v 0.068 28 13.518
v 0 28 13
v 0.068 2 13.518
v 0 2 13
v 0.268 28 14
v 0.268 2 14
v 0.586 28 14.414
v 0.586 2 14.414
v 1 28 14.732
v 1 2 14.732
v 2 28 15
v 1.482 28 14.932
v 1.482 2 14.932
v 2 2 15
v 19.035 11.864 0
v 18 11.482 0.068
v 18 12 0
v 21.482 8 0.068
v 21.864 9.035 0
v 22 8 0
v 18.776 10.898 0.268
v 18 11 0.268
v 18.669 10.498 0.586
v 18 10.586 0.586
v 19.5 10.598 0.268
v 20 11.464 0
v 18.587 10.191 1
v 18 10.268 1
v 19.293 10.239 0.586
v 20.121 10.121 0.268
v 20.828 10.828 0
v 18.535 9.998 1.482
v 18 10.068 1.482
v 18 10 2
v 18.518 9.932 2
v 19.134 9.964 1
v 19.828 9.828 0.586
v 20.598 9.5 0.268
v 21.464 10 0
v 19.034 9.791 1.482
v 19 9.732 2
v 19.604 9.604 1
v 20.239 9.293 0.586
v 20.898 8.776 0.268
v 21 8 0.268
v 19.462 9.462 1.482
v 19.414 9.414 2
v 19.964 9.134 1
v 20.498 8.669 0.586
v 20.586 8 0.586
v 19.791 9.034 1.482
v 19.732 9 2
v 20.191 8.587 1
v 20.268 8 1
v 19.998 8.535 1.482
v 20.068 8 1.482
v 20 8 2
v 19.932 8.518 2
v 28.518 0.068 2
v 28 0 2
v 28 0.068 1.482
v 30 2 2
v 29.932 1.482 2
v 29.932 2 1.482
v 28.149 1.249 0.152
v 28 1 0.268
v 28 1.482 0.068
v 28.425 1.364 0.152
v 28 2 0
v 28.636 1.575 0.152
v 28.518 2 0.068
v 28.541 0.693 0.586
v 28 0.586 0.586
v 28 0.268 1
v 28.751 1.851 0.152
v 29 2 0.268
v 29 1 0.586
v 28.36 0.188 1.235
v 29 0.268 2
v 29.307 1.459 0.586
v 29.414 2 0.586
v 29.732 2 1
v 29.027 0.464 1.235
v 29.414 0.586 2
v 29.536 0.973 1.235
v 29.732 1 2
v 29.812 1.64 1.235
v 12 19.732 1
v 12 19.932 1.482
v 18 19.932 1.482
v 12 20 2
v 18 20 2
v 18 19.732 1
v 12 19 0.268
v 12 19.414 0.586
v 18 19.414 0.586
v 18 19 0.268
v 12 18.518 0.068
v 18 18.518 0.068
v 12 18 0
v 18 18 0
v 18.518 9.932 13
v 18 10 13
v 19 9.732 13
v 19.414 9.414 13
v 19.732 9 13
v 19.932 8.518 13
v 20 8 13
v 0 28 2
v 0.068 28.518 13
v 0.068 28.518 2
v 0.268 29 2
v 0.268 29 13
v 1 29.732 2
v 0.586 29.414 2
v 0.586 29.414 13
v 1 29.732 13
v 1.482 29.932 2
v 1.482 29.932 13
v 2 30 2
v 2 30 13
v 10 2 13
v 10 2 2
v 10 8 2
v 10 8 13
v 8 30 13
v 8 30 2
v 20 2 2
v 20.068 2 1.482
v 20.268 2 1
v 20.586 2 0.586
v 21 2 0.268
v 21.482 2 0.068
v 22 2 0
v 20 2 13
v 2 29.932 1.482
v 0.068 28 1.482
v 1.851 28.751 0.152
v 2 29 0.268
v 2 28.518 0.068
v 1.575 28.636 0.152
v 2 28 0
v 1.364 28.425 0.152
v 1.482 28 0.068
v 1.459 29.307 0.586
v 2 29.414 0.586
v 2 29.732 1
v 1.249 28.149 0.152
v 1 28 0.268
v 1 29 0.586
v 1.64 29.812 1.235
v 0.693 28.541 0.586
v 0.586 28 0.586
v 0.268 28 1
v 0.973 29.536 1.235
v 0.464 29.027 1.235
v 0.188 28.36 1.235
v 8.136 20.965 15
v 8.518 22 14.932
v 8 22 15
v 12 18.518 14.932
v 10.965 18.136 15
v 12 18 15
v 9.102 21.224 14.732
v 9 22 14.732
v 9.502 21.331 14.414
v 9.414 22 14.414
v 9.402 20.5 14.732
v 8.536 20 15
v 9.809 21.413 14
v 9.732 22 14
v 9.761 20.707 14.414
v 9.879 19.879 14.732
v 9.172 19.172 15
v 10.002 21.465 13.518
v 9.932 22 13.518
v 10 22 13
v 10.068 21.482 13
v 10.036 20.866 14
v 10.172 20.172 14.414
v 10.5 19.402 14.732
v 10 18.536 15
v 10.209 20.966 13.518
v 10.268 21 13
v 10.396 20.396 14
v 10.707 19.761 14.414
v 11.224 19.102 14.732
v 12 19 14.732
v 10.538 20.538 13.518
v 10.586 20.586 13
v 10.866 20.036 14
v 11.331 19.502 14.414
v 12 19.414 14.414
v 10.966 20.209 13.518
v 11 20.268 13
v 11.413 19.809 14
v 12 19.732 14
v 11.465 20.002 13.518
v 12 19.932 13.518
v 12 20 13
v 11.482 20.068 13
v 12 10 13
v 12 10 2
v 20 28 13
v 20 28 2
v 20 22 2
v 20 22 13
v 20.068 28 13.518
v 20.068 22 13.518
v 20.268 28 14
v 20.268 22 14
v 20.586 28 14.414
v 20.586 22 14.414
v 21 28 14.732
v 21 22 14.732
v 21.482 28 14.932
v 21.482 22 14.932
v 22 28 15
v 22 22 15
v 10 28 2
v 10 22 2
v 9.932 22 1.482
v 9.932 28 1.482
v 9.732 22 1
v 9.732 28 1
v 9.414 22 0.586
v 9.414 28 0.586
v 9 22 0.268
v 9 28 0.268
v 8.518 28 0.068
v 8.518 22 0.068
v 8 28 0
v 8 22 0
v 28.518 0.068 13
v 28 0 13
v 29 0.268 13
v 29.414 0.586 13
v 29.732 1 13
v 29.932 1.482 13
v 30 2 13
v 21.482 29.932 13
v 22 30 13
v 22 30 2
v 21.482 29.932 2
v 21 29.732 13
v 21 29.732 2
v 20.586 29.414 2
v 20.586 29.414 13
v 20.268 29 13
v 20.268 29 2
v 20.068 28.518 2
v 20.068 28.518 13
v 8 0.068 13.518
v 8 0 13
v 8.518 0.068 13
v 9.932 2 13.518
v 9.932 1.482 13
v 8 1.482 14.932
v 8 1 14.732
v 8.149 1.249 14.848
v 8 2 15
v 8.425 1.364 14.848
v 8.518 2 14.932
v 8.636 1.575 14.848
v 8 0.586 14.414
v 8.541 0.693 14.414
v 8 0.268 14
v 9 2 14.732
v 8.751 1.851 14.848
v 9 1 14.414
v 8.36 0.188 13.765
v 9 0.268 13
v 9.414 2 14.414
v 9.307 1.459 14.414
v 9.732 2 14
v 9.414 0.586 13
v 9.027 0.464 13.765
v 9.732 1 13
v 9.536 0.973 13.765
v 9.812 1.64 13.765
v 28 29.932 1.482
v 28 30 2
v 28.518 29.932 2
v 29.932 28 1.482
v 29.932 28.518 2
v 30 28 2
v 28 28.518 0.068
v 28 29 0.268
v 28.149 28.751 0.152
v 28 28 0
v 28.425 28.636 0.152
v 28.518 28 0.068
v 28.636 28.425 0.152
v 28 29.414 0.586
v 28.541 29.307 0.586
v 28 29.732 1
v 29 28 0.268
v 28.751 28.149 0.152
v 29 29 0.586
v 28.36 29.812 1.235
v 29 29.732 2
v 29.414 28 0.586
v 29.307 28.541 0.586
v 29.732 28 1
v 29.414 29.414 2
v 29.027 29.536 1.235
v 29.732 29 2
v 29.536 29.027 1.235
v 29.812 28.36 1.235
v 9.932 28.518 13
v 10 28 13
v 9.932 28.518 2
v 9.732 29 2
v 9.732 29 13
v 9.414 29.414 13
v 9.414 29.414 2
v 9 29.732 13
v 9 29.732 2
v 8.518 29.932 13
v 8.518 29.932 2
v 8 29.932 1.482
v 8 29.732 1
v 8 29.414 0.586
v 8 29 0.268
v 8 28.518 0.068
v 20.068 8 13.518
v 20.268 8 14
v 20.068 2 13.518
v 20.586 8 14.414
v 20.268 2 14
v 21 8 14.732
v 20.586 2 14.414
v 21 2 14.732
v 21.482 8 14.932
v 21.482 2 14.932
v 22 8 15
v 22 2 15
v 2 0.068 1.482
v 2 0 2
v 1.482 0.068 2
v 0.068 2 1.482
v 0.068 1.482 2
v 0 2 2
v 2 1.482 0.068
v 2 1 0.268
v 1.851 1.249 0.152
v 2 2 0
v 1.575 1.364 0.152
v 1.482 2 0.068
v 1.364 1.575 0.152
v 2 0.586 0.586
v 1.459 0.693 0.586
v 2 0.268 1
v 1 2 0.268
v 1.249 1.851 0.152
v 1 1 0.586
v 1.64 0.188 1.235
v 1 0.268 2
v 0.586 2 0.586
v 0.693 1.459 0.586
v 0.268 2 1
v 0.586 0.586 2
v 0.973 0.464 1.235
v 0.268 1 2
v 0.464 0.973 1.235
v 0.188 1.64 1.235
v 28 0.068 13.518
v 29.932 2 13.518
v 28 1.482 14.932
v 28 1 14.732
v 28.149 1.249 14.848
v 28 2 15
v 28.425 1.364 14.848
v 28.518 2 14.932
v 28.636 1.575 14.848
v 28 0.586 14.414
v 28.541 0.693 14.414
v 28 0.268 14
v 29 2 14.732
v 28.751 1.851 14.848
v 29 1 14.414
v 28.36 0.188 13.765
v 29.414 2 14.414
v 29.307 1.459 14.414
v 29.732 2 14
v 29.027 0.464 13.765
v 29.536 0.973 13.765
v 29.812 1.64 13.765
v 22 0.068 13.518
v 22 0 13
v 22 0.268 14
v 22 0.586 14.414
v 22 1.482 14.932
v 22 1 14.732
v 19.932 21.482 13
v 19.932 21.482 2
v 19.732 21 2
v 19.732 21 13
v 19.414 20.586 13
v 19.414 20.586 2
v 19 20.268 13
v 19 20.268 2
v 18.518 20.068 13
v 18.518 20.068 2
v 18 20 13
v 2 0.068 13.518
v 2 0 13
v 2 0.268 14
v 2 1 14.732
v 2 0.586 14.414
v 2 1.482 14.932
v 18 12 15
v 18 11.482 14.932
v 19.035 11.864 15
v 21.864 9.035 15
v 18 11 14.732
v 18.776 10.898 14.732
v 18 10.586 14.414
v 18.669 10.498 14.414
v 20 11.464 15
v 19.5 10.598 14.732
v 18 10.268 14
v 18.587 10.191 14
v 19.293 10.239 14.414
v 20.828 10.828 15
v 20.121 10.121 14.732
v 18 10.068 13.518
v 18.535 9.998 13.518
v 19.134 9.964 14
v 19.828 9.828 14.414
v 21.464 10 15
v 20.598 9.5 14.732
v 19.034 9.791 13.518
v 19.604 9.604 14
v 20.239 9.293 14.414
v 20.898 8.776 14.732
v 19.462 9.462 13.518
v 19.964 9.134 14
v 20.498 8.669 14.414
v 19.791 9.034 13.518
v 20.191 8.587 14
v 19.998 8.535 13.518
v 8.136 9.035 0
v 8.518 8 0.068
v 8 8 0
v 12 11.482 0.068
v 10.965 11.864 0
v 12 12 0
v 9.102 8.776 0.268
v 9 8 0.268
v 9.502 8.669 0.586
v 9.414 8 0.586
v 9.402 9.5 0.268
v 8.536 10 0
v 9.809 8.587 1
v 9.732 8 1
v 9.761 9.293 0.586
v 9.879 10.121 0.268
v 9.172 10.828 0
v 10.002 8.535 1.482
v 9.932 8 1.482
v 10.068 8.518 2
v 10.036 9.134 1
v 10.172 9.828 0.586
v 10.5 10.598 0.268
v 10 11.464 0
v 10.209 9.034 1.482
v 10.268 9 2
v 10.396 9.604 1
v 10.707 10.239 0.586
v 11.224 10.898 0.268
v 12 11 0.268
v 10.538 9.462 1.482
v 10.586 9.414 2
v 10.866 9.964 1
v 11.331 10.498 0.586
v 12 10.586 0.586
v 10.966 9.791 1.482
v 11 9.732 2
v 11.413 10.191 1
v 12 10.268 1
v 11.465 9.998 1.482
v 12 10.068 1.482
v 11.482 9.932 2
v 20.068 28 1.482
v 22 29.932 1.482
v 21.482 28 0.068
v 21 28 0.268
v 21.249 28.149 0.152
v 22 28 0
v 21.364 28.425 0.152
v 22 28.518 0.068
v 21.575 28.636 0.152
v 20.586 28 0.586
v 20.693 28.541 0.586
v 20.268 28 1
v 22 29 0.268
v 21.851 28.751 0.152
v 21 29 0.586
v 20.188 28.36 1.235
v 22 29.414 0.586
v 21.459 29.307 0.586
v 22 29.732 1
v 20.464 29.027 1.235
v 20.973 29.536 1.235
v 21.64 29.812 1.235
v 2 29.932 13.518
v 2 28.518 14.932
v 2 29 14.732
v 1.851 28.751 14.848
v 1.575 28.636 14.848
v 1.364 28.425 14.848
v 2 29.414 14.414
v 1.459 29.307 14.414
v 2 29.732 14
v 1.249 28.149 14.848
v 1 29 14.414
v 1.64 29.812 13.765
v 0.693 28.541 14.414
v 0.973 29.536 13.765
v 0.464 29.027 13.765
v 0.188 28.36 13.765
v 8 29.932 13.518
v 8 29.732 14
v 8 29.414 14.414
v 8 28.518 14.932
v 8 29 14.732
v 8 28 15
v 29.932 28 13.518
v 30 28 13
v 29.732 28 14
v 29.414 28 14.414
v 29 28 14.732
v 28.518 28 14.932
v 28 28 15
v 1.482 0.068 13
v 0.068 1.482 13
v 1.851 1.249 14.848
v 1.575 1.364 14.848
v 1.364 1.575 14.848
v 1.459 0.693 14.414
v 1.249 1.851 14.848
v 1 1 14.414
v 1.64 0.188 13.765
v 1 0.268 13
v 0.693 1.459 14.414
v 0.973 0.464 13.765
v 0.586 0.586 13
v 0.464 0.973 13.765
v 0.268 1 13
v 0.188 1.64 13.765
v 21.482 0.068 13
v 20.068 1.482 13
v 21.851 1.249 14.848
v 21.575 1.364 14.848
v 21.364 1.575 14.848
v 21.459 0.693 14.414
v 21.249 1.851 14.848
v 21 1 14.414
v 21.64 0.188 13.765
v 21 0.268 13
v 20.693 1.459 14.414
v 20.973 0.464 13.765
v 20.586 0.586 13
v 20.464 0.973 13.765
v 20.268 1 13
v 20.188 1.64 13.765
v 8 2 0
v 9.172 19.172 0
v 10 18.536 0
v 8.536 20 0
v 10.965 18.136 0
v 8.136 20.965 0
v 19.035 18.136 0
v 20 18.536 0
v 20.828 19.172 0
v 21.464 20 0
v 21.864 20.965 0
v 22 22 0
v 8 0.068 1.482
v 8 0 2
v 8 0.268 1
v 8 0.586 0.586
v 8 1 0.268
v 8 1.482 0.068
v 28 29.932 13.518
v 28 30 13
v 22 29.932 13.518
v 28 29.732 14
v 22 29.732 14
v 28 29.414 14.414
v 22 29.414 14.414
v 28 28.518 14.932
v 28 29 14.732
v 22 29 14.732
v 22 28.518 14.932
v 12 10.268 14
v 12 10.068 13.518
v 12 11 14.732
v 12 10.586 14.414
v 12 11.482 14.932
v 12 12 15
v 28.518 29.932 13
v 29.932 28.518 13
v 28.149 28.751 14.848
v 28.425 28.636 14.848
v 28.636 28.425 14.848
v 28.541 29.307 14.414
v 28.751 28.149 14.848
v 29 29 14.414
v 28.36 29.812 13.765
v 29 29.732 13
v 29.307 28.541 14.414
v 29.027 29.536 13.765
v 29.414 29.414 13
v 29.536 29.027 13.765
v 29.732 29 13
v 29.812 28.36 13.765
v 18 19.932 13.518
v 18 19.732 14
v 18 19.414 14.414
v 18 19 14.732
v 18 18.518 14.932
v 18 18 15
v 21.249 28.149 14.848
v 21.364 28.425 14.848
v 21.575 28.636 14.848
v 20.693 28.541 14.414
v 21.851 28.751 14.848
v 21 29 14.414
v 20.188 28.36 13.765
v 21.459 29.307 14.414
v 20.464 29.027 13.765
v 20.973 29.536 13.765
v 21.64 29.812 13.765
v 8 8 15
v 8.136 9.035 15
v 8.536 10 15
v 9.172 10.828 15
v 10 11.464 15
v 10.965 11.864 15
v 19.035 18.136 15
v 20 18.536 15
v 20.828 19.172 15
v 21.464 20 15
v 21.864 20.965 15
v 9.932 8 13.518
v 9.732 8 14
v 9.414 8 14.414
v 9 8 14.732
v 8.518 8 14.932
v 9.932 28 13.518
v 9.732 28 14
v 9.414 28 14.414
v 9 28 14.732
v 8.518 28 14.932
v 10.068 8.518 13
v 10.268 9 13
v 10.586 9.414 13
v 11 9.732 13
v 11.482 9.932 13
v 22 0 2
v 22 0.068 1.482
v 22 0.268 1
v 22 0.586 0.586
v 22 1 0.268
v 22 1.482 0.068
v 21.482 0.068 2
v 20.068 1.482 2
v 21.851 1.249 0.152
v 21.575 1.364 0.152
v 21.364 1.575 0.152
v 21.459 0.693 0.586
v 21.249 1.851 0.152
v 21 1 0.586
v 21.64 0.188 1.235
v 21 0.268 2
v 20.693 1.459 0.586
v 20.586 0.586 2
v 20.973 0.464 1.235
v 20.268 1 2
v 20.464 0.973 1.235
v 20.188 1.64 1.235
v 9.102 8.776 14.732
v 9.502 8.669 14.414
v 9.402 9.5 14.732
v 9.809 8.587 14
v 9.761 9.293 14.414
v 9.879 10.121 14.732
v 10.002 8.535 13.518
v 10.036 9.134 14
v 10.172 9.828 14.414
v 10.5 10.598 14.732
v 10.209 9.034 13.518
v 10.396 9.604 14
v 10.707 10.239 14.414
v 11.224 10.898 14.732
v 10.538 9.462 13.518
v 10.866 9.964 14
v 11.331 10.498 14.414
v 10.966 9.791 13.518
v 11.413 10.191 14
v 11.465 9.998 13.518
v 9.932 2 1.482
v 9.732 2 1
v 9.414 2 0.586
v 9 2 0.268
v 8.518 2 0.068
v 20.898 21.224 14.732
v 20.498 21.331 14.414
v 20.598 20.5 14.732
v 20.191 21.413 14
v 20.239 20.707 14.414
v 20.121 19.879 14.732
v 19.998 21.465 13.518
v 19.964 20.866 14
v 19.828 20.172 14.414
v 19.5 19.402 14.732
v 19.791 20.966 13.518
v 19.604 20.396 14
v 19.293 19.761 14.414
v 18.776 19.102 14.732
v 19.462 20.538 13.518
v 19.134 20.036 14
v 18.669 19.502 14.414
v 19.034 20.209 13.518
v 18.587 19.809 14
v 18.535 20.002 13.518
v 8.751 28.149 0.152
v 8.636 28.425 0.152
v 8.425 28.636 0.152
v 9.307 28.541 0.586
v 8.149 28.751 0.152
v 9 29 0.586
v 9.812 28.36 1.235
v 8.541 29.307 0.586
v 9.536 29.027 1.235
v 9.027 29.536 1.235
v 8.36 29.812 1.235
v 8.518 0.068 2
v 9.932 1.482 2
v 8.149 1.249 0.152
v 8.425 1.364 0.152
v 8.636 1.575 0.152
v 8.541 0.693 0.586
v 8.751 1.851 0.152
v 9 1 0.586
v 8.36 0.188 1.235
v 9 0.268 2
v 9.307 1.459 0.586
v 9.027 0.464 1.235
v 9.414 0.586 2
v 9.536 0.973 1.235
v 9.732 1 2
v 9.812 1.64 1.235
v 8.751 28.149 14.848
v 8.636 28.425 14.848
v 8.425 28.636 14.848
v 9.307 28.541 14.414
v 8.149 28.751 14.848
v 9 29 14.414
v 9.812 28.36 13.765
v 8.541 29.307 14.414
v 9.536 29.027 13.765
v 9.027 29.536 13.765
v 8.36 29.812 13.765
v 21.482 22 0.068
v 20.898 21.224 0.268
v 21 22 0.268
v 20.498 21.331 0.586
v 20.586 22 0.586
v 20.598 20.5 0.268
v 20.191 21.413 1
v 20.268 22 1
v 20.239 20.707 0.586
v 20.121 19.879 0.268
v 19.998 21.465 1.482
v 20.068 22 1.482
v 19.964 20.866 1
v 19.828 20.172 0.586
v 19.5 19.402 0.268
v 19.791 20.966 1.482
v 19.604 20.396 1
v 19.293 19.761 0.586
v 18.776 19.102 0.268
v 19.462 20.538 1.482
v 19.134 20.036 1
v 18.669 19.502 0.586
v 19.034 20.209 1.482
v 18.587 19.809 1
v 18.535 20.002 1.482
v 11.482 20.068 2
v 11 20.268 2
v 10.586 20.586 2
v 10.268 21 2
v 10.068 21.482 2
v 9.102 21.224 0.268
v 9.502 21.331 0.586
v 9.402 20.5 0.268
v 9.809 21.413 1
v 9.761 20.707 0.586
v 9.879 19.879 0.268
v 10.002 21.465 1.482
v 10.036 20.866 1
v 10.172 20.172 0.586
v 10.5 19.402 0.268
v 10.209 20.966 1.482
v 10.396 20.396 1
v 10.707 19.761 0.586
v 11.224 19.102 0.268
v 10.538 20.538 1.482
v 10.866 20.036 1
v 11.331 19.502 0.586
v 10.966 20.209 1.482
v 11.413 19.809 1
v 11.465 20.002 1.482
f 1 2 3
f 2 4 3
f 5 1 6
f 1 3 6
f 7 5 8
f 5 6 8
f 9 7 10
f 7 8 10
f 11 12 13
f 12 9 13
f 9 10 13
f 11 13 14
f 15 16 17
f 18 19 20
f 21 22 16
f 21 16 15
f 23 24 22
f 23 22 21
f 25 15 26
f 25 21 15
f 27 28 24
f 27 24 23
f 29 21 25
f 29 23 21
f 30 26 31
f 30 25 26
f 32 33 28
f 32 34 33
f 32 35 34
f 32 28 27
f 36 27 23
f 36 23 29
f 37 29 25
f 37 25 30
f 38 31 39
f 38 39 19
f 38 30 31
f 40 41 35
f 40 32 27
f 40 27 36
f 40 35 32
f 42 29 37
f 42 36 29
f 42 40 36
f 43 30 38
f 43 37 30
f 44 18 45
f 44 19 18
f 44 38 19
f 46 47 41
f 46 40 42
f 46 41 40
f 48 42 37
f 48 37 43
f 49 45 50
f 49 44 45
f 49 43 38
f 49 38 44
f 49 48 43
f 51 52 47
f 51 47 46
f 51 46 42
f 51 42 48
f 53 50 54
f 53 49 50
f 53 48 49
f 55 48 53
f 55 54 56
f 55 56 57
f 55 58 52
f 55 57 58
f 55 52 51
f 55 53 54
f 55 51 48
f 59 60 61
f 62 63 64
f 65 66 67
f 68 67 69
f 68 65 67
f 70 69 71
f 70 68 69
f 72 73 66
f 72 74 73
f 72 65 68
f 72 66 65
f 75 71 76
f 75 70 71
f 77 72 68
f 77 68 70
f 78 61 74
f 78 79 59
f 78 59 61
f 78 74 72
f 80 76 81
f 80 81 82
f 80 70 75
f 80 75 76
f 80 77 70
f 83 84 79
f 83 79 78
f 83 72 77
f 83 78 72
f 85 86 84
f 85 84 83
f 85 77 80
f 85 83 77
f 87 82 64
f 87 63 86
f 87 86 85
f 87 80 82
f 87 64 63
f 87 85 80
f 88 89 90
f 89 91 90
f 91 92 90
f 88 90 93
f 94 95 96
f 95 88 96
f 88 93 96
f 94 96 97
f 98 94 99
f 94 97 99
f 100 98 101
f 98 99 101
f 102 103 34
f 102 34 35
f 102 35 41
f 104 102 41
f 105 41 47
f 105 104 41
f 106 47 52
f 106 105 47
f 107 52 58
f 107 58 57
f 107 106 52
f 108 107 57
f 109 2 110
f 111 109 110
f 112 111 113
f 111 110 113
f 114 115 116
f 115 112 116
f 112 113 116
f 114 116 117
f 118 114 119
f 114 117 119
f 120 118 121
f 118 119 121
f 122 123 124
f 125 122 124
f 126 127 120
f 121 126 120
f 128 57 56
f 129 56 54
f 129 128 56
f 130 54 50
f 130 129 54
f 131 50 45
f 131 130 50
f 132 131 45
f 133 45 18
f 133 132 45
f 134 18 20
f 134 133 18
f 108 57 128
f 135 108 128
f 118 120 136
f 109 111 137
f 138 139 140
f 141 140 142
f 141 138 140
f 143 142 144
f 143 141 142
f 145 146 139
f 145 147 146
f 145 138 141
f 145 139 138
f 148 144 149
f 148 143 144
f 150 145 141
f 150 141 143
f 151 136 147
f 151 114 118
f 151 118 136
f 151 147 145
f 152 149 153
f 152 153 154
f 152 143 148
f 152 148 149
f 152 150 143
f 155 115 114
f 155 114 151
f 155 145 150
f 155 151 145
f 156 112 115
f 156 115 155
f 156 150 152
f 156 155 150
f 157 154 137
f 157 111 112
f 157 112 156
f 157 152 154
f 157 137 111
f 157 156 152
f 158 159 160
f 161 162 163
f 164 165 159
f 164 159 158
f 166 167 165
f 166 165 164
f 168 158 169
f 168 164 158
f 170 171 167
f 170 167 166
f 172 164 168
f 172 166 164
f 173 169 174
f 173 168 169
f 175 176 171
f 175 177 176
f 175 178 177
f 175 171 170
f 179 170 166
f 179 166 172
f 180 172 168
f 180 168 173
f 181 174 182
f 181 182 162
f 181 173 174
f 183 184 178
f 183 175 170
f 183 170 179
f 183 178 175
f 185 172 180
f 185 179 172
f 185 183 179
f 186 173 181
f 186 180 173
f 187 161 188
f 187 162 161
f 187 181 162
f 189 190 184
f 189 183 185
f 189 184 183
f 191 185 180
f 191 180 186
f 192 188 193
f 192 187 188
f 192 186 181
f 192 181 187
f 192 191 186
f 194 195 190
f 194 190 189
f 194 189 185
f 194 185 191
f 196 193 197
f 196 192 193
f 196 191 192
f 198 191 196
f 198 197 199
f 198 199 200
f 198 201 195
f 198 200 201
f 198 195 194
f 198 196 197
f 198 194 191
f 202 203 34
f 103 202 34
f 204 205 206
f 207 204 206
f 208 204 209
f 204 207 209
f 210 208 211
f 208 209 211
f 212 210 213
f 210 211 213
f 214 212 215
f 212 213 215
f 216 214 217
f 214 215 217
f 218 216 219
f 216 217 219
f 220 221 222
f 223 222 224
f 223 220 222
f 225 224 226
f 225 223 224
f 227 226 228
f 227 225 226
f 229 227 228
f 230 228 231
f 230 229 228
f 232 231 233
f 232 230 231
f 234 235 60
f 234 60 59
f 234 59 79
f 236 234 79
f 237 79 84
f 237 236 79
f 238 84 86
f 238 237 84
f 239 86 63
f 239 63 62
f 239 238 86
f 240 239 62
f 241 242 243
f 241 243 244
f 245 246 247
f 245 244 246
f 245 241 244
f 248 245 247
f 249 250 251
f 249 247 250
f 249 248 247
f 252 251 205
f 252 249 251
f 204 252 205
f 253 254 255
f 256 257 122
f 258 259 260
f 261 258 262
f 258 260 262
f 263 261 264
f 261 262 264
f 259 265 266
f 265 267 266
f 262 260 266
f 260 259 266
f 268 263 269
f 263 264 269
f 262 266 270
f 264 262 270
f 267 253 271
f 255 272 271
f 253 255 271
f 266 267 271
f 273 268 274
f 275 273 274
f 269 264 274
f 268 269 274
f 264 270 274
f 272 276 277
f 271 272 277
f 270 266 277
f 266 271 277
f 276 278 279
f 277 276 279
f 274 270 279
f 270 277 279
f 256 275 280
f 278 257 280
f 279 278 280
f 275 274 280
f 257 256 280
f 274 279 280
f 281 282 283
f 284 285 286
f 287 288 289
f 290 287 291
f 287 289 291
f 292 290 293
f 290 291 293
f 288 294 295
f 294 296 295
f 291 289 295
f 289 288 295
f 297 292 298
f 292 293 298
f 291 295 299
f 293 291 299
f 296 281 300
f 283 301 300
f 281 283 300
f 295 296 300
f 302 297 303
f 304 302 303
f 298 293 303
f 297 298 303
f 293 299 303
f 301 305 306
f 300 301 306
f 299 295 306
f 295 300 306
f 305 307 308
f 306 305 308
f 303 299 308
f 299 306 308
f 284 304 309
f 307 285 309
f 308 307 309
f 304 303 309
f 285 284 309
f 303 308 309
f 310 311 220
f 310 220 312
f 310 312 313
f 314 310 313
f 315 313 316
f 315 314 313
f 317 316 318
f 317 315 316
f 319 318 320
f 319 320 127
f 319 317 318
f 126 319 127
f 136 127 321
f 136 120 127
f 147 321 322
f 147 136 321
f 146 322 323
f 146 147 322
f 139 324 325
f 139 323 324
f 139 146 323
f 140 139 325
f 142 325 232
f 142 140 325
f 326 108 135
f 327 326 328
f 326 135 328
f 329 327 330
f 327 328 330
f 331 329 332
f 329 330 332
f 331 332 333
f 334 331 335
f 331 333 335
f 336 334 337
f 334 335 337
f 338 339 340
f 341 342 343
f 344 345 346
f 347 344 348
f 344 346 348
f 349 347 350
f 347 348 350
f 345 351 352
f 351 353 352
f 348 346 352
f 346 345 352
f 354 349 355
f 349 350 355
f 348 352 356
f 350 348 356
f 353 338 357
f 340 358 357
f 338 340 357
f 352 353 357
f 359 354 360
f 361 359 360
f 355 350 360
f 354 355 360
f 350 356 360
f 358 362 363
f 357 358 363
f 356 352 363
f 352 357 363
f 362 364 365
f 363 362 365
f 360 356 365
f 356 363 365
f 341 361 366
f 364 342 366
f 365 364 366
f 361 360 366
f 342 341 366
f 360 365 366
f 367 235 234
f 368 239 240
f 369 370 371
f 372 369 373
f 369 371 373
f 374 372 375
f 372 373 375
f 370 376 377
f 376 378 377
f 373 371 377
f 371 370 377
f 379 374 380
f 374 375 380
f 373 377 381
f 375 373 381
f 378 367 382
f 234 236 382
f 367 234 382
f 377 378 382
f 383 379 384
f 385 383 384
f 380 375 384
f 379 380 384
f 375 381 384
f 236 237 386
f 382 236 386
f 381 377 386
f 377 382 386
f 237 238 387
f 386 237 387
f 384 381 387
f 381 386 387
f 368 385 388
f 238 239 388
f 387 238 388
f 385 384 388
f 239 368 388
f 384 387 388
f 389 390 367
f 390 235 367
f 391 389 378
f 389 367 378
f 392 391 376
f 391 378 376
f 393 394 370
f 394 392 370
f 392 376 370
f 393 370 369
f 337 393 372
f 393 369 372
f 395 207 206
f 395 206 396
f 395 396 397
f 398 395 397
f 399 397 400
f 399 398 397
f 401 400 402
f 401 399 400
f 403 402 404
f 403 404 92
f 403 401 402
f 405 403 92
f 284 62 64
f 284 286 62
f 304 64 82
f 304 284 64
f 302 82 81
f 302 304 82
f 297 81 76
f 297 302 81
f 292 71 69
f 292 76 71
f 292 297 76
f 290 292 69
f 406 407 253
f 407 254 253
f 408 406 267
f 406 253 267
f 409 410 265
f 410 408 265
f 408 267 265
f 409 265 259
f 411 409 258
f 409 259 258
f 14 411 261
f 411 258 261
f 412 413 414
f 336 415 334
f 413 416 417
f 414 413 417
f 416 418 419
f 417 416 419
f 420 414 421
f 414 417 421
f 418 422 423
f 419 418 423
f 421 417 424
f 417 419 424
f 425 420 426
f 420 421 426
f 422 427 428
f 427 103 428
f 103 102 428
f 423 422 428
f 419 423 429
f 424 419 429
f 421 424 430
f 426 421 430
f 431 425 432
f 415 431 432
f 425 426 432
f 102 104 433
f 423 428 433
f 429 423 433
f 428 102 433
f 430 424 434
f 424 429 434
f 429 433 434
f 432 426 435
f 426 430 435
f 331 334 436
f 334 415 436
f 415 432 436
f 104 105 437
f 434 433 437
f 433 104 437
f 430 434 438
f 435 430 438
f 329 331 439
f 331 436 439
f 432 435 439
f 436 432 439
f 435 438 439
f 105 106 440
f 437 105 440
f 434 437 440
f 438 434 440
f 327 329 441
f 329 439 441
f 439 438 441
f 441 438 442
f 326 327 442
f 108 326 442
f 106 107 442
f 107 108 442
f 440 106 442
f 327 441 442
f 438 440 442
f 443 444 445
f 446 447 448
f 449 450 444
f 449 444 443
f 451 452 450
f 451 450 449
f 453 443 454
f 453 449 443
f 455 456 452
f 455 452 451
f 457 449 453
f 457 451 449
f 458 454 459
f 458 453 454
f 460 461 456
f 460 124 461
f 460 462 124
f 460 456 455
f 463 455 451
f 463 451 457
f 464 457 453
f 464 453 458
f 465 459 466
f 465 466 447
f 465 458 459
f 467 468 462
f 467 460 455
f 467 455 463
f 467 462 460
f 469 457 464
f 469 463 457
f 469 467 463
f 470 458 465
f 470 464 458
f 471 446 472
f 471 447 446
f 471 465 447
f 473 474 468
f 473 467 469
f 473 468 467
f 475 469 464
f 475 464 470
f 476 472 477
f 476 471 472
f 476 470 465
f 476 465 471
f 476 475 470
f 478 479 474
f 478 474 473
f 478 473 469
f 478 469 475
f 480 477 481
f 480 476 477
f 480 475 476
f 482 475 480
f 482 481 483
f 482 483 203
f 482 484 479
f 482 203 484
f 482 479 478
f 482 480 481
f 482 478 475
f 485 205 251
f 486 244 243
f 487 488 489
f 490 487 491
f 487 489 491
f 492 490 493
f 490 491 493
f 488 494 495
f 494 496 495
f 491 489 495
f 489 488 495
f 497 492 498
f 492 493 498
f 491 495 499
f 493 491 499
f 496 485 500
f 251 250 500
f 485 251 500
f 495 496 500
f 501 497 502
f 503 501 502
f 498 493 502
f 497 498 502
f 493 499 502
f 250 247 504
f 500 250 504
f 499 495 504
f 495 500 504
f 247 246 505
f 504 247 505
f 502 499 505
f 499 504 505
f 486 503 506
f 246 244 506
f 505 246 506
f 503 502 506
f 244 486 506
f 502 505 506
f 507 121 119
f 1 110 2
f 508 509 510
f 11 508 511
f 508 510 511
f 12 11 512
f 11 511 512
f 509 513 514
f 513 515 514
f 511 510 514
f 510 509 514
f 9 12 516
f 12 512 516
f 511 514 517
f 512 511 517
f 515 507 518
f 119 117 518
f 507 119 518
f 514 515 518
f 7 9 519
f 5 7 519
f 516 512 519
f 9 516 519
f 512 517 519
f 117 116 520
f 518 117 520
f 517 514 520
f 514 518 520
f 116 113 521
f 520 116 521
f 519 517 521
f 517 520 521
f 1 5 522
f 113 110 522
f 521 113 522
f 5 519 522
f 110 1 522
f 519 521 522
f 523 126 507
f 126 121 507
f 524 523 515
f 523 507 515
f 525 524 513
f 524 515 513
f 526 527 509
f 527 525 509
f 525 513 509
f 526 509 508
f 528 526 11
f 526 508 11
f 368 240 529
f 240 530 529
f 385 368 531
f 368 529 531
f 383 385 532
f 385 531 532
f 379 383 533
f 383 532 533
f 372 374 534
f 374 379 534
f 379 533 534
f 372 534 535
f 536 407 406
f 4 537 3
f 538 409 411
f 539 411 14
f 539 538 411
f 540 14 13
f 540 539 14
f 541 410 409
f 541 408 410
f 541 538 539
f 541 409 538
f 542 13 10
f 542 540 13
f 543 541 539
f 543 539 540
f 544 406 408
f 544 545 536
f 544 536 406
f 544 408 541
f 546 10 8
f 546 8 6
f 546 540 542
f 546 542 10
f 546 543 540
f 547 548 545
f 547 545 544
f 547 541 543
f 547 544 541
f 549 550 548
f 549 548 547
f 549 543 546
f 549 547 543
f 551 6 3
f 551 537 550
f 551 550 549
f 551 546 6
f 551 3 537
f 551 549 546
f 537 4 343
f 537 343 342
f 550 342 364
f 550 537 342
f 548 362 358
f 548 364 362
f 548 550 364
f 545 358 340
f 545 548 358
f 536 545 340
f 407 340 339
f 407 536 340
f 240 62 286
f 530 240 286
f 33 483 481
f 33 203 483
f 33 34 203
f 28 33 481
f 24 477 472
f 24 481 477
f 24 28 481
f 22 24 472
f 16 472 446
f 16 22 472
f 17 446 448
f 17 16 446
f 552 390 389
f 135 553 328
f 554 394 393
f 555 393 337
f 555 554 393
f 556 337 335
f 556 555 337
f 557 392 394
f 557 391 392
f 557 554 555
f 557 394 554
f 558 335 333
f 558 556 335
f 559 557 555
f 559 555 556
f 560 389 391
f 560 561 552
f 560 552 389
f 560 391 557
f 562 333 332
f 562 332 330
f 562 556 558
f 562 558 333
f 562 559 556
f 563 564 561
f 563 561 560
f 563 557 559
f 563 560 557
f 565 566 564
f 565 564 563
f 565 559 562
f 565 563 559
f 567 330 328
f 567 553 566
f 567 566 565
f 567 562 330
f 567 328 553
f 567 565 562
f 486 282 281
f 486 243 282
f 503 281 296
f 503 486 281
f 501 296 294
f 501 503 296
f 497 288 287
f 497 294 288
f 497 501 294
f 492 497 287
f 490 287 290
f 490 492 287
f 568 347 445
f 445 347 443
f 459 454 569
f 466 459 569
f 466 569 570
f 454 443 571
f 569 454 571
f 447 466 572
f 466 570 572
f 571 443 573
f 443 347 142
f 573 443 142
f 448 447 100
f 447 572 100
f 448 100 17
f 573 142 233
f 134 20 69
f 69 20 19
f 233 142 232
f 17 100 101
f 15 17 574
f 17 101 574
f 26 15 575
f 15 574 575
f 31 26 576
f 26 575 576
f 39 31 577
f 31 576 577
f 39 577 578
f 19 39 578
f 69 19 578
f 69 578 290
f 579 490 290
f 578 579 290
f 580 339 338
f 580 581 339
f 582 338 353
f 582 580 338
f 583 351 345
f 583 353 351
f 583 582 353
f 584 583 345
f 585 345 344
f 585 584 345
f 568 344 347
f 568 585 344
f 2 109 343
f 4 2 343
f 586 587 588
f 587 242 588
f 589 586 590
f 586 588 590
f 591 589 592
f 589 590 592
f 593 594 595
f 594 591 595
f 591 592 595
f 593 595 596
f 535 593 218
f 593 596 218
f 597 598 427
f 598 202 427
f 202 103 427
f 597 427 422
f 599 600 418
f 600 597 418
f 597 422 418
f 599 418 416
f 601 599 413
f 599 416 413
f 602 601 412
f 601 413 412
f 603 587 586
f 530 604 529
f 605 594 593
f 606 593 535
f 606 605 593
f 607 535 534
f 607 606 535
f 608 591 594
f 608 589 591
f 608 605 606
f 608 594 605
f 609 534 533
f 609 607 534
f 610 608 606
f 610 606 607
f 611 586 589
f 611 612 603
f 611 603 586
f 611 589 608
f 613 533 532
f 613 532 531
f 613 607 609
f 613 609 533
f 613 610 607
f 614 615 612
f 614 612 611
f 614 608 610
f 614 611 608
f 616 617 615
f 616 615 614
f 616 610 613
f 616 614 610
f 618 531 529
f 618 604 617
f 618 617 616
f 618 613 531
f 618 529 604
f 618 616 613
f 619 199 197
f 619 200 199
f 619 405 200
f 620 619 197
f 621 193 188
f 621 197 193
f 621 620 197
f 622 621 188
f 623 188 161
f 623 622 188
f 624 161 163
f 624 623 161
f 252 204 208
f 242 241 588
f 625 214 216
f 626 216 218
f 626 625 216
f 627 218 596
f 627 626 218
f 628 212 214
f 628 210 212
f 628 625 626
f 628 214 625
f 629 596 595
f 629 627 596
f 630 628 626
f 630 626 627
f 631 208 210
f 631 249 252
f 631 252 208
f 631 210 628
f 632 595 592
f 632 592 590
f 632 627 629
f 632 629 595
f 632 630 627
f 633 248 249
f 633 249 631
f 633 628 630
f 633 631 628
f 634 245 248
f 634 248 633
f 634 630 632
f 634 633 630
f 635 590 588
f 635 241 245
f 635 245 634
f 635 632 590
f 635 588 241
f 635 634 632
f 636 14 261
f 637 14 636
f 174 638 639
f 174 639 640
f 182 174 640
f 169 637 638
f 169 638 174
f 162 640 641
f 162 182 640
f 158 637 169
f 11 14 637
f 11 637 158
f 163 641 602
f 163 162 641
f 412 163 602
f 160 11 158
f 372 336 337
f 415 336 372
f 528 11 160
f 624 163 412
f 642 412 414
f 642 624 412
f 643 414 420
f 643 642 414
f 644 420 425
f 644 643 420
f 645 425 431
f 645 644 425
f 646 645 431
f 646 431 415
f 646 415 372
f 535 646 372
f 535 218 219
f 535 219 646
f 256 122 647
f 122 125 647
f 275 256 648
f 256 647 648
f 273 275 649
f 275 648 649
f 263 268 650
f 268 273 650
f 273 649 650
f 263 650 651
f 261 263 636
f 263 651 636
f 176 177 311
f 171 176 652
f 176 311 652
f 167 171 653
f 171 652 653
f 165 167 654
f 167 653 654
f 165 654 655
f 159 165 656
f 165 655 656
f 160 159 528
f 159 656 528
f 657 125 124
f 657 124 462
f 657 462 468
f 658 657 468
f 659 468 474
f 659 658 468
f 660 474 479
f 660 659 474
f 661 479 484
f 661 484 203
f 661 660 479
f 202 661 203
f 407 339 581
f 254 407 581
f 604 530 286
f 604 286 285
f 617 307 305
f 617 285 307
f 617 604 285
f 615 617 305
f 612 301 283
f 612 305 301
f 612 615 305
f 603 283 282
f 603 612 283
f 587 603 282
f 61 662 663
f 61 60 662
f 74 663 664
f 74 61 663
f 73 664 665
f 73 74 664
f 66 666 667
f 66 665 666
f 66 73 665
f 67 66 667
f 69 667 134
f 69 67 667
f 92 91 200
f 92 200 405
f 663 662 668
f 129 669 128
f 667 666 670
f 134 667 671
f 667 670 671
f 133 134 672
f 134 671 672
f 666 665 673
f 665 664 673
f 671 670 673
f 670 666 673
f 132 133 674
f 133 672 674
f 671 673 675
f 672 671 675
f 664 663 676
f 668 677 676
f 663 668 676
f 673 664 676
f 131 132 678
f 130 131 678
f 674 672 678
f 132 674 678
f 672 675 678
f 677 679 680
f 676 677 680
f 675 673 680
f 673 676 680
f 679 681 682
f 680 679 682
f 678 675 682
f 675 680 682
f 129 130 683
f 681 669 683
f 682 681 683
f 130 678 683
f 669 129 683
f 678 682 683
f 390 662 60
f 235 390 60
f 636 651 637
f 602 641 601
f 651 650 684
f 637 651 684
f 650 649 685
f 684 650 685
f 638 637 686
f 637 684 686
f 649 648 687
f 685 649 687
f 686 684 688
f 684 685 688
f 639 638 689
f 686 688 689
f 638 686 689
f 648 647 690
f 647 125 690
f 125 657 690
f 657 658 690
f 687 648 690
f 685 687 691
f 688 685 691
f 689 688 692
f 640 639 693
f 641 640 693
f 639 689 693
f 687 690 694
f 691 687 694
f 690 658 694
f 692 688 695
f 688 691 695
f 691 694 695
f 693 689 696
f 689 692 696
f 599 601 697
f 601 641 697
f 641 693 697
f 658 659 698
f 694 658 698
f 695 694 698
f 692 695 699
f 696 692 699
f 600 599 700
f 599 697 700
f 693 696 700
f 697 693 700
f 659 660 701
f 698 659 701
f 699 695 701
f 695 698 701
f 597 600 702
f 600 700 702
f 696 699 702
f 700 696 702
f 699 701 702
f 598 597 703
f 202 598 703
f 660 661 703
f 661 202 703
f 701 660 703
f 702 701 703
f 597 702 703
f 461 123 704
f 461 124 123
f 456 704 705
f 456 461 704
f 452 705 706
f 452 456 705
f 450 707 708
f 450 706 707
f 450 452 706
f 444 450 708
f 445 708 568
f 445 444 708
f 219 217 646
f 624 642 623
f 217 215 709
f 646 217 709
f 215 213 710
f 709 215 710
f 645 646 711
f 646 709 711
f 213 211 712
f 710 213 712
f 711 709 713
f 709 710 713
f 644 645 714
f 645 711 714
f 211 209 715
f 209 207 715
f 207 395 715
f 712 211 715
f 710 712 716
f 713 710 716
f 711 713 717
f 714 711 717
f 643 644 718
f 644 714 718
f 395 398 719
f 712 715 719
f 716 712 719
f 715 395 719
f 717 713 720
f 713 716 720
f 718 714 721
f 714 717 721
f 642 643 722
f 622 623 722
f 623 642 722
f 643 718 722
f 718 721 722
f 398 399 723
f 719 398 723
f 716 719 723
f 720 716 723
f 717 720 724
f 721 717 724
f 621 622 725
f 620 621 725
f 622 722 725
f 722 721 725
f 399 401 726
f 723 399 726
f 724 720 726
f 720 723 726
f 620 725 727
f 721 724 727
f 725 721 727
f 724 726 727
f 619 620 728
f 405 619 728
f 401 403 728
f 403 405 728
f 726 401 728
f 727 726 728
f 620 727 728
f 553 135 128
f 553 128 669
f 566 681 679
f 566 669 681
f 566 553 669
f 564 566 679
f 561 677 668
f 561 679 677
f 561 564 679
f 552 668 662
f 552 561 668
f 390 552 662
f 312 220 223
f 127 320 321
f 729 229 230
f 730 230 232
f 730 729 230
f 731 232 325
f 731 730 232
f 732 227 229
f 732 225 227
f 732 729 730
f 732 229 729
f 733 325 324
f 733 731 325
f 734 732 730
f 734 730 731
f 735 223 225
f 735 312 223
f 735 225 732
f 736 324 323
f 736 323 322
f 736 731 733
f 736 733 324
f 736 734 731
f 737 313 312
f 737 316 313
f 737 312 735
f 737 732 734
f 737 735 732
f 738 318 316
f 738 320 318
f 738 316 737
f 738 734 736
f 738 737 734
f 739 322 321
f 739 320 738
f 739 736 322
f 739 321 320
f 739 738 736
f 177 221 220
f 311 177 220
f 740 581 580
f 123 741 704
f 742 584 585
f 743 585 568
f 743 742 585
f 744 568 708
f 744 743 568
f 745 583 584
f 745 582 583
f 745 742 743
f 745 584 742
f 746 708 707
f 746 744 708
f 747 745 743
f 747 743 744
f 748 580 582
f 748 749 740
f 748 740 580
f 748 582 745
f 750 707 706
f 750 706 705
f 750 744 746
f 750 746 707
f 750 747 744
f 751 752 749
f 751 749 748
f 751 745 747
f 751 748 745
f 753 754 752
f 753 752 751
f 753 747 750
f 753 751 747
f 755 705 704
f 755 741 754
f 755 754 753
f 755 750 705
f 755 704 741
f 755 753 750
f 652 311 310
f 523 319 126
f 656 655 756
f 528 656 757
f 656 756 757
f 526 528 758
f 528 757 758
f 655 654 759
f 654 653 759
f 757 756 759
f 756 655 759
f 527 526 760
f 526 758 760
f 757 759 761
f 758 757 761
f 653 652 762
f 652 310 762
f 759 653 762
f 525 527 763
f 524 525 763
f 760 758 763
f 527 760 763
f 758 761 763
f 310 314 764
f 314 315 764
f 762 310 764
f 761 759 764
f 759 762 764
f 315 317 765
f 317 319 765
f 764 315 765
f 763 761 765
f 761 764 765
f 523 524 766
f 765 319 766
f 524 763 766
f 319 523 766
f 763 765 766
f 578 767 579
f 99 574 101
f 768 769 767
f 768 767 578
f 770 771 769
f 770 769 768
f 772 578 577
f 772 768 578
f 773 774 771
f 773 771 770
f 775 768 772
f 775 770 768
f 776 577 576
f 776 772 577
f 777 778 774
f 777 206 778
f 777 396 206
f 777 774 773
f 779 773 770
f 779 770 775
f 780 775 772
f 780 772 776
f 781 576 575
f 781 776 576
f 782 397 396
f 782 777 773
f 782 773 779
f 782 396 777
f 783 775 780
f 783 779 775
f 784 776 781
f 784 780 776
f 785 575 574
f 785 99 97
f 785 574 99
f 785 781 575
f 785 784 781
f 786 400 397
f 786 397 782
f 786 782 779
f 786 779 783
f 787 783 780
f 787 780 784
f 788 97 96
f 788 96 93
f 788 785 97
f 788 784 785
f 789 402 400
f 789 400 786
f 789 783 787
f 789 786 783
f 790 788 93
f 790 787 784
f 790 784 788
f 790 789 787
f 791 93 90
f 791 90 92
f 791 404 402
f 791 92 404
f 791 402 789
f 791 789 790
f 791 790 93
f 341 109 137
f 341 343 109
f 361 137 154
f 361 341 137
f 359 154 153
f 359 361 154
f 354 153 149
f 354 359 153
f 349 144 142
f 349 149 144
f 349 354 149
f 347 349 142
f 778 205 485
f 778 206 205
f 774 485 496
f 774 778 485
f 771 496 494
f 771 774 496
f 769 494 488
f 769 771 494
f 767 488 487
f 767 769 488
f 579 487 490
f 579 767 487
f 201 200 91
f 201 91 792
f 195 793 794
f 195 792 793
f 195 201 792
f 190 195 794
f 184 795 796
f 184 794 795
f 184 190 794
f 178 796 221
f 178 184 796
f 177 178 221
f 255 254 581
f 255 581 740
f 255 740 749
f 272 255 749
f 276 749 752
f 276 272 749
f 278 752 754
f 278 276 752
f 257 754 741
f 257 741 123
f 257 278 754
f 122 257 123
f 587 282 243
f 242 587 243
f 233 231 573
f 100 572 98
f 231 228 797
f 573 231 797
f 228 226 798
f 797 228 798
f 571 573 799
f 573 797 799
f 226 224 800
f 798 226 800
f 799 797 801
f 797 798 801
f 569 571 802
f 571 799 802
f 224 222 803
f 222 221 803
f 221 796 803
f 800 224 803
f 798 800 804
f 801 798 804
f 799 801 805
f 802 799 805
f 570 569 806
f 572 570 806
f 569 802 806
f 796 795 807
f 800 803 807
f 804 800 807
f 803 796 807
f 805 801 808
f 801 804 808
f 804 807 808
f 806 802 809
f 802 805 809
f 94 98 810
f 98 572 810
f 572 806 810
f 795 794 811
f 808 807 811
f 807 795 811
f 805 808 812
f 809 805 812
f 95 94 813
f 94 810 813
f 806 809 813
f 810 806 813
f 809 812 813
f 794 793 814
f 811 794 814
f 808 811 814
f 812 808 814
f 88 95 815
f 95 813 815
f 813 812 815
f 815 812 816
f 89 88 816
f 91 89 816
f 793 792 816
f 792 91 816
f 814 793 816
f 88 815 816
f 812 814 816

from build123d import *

# Parameters (mm, degrees)
F0_W     = 10
F0_H     = 10
F1_DEPTH = 15
F2_R     = 2


with BuildPart() as f1:
    # F0 (on Top) → F1 (new body)
    with BuildSketch(Plane.XY):
        Polygon((0, 30), (0, 0), (10, 0), (10, 10), (10, 20), (10, 30), align=None)
        with Locations((15, 15)):
            Rectangle(F0_W, F0_H)
        Polygon((20, 20), (20, 10), (20, 0), (30, 0), (30, 30), (20, 30), align=None)
    extrude(amount=F1_DEPTH)

    # F2
    f2_edges = [f1.edges().sort_by_distance(p)[0] for p in [
        (0, 30, 7.5),
        (20, 30, 7.5),
        (0, 0, 7.5),
        (10, 0, 7.5),
        (5, 0, 0),
        (5, 0, 15),
        (20, 0, 7.5),
        (30, 0, 7.5),
        (25, 0, 0),
        (25, 0, 15),
        (10, 20, 7.5),
        (10, 30, 7.5),
        (10, 25, 0),
        (10, 25, 15),
        (20, 20, 7.5),
        (20, 25, 0),
        (20, 25, 15),
        (30, 30, 7.5),
        (25, 30, 0),
        (25, 30, 15),
        (30, 15, 15),
        (10, 10, 7.5),
        (10, 5, 0),
        (10, 5, 15),
        (5, 30, 0),
        (5, 30, 15),
        (15, 20, 15),
        (20, 10, 7.5),
        (15, 10, 0),
        (15, 10, 15),
        (20, 5, 15),
        (0, 15, 0),
        (0, 15, 15),
        (30, 15, 0),
        (20, 5, 0),
        (15, 20, 0),
    ]]
    fillet(f2_edges, radius=F2_R)


solid = f1.part
